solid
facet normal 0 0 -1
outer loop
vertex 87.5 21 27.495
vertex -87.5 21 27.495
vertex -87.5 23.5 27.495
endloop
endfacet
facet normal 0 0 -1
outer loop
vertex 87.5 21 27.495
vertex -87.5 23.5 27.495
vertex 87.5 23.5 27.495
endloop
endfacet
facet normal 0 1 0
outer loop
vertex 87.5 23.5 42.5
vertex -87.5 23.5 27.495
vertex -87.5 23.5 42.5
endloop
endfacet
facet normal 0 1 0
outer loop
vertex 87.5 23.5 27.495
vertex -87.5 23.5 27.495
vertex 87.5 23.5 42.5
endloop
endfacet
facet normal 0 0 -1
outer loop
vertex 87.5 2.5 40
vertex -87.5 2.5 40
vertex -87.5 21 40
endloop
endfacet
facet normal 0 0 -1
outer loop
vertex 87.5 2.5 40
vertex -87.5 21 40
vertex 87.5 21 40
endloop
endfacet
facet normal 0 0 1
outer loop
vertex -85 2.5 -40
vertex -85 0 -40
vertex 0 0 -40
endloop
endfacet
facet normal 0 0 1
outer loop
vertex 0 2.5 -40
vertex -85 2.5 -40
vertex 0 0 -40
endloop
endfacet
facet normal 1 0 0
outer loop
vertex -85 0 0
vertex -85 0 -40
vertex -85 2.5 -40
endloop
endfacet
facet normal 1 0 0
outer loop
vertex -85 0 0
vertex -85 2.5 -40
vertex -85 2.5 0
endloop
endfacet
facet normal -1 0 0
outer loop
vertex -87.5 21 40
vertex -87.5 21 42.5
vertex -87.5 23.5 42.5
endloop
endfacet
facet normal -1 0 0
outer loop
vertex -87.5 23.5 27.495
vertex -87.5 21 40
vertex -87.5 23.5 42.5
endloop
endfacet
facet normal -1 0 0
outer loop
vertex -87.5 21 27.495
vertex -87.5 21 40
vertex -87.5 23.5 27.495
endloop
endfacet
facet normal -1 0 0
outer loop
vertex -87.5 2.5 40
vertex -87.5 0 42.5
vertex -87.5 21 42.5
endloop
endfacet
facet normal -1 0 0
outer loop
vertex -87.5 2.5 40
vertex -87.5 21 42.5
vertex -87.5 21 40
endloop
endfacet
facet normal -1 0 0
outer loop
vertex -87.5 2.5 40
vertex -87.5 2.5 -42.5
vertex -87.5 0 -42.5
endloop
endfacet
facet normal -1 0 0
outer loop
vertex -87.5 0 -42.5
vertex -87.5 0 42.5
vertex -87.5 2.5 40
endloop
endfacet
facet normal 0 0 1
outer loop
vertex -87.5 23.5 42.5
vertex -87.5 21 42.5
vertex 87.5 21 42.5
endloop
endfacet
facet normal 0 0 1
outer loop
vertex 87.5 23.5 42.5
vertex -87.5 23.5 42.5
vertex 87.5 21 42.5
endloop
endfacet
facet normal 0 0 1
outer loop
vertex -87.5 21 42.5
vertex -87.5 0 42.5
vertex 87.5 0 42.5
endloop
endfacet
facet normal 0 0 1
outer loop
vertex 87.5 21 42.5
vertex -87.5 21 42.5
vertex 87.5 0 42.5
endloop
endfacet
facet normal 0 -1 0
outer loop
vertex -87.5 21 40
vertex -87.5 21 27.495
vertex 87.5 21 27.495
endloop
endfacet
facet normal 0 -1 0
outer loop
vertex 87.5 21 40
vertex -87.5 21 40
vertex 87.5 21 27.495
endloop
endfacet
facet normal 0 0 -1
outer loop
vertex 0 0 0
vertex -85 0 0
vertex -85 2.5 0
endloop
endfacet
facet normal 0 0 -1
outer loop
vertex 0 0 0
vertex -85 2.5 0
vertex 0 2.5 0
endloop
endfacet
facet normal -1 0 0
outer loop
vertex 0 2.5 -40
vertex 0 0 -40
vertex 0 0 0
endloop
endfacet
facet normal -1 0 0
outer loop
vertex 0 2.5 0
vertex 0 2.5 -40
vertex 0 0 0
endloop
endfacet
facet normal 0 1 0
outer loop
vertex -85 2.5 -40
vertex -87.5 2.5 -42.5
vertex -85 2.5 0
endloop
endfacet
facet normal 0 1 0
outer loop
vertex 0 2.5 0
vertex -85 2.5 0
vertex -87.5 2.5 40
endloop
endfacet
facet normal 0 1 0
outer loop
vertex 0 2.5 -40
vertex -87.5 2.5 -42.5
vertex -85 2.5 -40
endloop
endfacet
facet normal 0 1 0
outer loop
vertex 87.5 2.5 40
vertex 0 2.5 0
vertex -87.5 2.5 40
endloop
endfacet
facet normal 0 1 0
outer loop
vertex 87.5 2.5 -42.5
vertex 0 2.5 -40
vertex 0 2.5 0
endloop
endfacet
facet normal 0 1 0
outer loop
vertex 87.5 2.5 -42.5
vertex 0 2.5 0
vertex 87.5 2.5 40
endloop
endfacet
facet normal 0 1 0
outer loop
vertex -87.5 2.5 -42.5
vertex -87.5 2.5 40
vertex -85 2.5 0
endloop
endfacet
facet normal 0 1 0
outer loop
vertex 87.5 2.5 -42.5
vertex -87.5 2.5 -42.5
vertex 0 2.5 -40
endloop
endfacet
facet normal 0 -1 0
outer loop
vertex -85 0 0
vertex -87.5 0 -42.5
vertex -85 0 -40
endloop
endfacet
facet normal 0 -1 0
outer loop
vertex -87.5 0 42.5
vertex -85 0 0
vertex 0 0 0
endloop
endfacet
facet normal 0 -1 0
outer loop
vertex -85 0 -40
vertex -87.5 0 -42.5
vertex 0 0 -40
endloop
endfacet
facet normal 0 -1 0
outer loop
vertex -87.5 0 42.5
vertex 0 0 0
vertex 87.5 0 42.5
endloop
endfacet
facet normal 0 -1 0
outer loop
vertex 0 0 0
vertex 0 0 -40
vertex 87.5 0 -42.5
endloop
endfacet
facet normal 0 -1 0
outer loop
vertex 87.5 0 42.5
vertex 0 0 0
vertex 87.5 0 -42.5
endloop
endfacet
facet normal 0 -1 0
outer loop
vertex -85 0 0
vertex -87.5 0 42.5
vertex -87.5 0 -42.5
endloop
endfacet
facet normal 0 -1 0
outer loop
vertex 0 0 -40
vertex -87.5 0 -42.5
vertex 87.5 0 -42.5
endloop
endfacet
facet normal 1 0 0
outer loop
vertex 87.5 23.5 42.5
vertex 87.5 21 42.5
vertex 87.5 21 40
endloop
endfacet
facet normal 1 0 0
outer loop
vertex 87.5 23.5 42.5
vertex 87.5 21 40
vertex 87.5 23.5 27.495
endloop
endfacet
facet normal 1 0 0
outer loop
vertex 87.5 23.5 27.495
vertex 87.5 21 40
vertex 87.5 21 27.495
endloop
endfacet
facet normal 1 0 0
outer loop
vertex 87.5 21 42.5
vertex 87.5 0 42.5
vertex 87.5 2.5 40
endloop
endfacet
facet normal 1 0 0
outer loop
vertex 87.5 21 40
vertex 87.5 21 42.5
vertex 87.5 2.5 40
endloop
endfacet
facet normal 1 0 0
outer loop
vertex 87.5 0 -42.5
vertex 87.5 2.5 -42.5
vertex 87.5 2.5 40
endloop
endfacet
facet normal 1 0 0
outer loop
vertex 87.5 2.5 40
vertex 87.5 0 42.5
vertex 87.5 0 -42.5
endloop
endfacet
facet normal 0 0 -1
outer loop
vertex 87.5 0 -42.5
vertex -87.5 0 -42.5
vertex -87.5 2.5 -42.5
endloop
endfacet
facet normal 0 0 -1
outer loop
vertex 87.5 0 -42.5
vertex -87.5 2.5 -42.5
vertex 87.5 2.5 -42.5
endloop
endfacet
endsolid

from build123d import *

# Parameters (mm, degrees)
SKETCH1_W           = 175
SKETCH1_H           = 85
BOSS_EXTRUDE1_DEPTH = 2.5
SKETCH2_W           = 85
SKETCH2_H           = 40
CUT_EXTRUDE1_DEPTH  = 2.5
SKETCH3_W           = 175
SKETCH3_H           = 2.5
BOSS_EXTRUDE2_DEPTH = 18.5
SKETCH4_W           = 175
SKETCH4_H           = 15.004979699
BOSS_EXTRUDE3_DEPTH = 2.5


with BuildPart() as part:
    # Sketch1 → Boss-Extrude1 (new body)
    with BuildSketch(Plane(origin=(0, 0, 0), x_dir=(1, 0, 0), z_dir=(0, 1, 0))):
        Rectangle(SKETCH1_W, SKETCH1_H)
    extrude(amount=BOSS_EXTRUDE1_DEPTH)

    # Sketch2 → Cut-Extrude1 (cut)
    with BuildSketch(Plane.XZ):
        with Locations((-42.5, -20)):
            Rectangle(SKETCH2_W, SKETCH2_H)
    extrude(amount=-CUT_EXTRUDE1_DEPTH, mode=Mode.SUBTRACT)

    # Sketch3 → Boss-Extrude2 (add)
    with BuildSketch(Plane(origin=(0, 2.5, 0), x_dir=(1, 0, 0), z_dir=(0, 1, 0))):
        with Locations((0, -41.25)):
            Rectangle(SKETCH3_W, SKETCH3_H)
    extrude(amount=BOSS_EXTRUDE2_DEPTH)

    # Sketch4 → Boss-Extrude3 (add)
    with BuildSketch(Plane(origin=(0, 21, 0), x_dir=(1, 0, 0), z_dir=(0, 1, 0))):
        with Locations((0, -34.99751015)):
            Rectangle(SKETCH4_W, SKETCH4_H)
    extrude(amount=BOSS_EXTRUDE3_DEPTH)


solid = part.part
